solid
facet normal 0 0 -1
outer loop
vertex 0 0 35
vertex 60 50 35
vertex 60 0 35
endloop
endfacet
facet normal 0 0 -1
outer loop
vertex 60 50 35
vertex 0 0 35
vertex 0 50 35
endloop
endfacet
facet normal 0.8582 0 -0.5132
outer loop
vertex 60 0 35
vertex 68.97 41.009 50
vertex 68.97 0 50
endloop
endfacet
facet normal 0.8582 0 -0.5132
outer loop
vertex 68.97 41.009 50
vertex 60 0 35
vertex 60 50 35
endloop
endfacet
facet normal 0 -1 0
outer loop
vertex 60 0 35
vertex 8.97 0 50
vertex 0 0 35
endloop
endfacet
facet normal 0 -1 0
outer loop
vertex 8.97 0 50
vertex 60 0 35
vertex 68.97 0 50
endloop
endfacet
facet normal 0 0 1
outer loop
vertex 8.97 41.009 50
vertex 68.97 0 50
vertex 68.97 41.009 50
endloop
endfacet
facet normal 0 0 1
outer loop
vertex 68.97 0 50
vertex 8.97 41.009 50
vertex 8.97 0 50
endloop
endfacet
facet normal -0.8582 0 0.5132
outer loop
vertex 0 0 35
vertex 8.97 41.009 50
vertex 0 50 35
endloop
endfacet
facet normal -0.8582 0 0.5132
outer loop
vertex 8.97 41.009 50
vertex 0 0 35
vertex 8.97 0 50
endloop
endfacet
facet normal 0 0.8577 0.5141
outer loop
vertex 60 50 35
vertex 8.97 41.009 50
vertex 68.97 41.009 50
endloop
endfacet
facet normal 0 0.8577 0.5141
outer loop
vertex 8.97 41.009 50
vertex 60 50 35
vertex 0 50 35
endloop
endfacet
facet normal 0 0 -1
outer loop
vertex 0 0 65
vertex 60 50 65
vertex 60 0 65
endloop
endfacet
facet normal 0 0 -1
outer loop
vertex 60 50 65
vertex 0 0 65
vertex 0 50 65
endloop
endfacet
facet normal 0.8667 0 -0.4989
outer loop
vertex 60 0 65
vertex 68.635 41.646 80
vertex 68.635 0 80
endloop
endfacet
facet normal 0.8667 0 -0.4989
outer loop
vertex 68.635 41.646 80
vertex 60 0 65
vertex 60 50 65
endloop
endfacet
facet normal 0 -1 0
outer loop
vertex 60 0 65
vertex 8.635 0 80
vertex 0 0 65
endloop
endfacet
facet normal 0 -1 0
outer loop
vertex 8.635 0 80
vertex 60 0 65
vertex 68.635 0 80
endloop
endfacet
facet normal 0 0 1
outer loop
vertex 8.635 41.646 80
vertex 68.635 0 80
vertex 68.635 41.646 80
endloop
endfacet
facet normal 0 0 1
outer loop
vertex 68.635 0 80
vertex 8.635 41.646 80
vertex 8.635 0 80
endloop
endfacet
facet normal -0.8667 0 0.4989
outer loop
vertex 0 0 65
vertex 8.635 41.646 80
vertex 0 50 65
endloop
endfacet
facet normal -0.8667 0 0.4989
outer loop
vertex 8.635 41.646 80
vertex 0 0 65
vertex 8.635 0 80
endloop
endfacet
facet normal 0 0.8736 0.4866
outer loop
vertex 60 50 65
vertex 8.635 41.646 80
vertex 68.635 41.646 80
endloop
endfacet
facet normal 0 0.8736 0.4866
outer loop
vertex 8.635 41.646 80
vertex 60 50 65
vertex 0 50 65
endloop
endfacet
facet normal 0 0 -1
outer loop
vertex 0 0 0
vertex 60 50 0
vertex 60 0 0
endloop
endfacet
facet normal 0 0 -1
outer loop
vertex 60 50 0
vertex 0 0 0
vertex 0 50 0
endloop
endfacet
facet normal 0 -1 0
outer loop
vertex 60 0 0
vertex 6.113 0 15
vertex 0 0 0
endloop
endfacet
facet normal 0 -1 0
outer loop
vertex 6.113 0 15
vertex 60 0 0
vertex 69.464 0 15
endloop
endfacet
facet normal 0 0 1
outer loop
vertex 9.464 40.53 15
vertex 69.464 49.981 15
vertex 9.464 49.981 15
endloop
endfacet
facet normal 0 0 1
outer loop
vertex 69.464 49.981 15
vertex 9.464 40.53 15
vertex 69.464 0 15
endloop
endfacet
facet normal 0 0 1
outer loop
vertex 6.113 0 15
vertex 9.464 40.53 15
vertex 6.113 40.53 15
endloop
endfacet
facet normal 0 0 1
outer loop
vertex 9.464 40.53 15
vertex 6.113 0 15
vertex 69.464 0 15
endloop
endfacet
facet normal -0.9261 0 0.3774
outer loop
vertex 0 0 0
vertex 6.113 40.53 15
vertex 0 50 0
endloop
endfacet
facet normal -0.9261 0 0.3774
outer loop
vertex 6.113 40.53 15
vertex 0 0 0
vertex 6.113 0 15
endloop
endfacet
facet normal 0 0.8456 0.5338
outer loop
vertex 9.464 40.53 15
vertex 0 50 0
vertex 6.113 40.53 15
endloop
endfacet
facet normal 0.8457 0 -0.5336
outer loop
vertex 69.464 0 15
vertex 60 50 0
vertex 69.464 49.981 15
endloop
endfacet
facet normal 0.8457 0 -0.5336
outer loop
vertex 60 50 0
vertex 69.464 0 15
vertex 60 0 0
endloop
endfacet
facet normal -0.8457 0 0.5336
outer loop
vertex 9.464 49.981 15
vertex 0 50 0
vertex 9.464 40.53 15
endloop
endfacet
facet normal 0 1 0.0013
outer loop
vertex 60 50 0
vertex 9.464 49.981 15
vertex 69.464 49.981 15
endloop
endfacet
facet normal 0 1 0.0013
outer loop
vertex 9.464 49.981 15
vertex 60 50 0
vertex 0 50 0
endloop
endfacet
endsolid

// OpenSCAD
/* [Cut table info] */

// How many tables and what is their width. Leave as 0 to ignore. (mm)
table_space = [20,15,0,0];

// Width of each spacer part (mm)
spacer_width = 15;

// Side from which balls are feeded into the bearing (either through inner or outer side)
base="S"; // [S:Single Side,B:Both sides]
 
/* [Other] */
// $fn resolution
fn = 150;

// Width and height of the geomety. max_dix is the maximumd difference allowed for the other part, sets the max slope
module base_geom(width, length, height, max_dif)
{
    //hull()
    {
        length_displacement = rands(min_value = length - max_dif*2, max_value = length, value_count = 1)[0];
        height2 = rands(min_value = height - max_dif, max_value = height, value_count = 1)[0];
        CubeFaces = [
            [0,1,2,3],  // bottom
            [4,5,1,0],  // front
            [7,6,5,4],  // top
            [5,6,2,1],  // right
            [6,7,3,2],  // back
            [7,4,0,3]]; // left

        CubePoints = [
            [0,0,0],[length,0,0],[length,height,0],[0,height,0],
            [length/2-length_displacement/2,0,width],[length/2-length_displacement/2+length,0,width],[length/2-length_displacement/2+length,height2,width],[length/2-length_displacement/2,height2,width]];

        polyhedron(CubePoints,CubeFaces);
    }

}

base_geom(spacer_width,60,50,10);

for(index = [0:len(table_space)])
{
    if (table_space[index] != 0)
    {   
        cumulativesum = [ for (a=0, b=table_space[0]; a < len(table_space); a= a+1, b=b+table_space[a]) b];
        translate([0,0,cumulativesum[index]+spacer_width*(index+1)])
        base_geom(spacer_width,60,50,10);
    }
}
